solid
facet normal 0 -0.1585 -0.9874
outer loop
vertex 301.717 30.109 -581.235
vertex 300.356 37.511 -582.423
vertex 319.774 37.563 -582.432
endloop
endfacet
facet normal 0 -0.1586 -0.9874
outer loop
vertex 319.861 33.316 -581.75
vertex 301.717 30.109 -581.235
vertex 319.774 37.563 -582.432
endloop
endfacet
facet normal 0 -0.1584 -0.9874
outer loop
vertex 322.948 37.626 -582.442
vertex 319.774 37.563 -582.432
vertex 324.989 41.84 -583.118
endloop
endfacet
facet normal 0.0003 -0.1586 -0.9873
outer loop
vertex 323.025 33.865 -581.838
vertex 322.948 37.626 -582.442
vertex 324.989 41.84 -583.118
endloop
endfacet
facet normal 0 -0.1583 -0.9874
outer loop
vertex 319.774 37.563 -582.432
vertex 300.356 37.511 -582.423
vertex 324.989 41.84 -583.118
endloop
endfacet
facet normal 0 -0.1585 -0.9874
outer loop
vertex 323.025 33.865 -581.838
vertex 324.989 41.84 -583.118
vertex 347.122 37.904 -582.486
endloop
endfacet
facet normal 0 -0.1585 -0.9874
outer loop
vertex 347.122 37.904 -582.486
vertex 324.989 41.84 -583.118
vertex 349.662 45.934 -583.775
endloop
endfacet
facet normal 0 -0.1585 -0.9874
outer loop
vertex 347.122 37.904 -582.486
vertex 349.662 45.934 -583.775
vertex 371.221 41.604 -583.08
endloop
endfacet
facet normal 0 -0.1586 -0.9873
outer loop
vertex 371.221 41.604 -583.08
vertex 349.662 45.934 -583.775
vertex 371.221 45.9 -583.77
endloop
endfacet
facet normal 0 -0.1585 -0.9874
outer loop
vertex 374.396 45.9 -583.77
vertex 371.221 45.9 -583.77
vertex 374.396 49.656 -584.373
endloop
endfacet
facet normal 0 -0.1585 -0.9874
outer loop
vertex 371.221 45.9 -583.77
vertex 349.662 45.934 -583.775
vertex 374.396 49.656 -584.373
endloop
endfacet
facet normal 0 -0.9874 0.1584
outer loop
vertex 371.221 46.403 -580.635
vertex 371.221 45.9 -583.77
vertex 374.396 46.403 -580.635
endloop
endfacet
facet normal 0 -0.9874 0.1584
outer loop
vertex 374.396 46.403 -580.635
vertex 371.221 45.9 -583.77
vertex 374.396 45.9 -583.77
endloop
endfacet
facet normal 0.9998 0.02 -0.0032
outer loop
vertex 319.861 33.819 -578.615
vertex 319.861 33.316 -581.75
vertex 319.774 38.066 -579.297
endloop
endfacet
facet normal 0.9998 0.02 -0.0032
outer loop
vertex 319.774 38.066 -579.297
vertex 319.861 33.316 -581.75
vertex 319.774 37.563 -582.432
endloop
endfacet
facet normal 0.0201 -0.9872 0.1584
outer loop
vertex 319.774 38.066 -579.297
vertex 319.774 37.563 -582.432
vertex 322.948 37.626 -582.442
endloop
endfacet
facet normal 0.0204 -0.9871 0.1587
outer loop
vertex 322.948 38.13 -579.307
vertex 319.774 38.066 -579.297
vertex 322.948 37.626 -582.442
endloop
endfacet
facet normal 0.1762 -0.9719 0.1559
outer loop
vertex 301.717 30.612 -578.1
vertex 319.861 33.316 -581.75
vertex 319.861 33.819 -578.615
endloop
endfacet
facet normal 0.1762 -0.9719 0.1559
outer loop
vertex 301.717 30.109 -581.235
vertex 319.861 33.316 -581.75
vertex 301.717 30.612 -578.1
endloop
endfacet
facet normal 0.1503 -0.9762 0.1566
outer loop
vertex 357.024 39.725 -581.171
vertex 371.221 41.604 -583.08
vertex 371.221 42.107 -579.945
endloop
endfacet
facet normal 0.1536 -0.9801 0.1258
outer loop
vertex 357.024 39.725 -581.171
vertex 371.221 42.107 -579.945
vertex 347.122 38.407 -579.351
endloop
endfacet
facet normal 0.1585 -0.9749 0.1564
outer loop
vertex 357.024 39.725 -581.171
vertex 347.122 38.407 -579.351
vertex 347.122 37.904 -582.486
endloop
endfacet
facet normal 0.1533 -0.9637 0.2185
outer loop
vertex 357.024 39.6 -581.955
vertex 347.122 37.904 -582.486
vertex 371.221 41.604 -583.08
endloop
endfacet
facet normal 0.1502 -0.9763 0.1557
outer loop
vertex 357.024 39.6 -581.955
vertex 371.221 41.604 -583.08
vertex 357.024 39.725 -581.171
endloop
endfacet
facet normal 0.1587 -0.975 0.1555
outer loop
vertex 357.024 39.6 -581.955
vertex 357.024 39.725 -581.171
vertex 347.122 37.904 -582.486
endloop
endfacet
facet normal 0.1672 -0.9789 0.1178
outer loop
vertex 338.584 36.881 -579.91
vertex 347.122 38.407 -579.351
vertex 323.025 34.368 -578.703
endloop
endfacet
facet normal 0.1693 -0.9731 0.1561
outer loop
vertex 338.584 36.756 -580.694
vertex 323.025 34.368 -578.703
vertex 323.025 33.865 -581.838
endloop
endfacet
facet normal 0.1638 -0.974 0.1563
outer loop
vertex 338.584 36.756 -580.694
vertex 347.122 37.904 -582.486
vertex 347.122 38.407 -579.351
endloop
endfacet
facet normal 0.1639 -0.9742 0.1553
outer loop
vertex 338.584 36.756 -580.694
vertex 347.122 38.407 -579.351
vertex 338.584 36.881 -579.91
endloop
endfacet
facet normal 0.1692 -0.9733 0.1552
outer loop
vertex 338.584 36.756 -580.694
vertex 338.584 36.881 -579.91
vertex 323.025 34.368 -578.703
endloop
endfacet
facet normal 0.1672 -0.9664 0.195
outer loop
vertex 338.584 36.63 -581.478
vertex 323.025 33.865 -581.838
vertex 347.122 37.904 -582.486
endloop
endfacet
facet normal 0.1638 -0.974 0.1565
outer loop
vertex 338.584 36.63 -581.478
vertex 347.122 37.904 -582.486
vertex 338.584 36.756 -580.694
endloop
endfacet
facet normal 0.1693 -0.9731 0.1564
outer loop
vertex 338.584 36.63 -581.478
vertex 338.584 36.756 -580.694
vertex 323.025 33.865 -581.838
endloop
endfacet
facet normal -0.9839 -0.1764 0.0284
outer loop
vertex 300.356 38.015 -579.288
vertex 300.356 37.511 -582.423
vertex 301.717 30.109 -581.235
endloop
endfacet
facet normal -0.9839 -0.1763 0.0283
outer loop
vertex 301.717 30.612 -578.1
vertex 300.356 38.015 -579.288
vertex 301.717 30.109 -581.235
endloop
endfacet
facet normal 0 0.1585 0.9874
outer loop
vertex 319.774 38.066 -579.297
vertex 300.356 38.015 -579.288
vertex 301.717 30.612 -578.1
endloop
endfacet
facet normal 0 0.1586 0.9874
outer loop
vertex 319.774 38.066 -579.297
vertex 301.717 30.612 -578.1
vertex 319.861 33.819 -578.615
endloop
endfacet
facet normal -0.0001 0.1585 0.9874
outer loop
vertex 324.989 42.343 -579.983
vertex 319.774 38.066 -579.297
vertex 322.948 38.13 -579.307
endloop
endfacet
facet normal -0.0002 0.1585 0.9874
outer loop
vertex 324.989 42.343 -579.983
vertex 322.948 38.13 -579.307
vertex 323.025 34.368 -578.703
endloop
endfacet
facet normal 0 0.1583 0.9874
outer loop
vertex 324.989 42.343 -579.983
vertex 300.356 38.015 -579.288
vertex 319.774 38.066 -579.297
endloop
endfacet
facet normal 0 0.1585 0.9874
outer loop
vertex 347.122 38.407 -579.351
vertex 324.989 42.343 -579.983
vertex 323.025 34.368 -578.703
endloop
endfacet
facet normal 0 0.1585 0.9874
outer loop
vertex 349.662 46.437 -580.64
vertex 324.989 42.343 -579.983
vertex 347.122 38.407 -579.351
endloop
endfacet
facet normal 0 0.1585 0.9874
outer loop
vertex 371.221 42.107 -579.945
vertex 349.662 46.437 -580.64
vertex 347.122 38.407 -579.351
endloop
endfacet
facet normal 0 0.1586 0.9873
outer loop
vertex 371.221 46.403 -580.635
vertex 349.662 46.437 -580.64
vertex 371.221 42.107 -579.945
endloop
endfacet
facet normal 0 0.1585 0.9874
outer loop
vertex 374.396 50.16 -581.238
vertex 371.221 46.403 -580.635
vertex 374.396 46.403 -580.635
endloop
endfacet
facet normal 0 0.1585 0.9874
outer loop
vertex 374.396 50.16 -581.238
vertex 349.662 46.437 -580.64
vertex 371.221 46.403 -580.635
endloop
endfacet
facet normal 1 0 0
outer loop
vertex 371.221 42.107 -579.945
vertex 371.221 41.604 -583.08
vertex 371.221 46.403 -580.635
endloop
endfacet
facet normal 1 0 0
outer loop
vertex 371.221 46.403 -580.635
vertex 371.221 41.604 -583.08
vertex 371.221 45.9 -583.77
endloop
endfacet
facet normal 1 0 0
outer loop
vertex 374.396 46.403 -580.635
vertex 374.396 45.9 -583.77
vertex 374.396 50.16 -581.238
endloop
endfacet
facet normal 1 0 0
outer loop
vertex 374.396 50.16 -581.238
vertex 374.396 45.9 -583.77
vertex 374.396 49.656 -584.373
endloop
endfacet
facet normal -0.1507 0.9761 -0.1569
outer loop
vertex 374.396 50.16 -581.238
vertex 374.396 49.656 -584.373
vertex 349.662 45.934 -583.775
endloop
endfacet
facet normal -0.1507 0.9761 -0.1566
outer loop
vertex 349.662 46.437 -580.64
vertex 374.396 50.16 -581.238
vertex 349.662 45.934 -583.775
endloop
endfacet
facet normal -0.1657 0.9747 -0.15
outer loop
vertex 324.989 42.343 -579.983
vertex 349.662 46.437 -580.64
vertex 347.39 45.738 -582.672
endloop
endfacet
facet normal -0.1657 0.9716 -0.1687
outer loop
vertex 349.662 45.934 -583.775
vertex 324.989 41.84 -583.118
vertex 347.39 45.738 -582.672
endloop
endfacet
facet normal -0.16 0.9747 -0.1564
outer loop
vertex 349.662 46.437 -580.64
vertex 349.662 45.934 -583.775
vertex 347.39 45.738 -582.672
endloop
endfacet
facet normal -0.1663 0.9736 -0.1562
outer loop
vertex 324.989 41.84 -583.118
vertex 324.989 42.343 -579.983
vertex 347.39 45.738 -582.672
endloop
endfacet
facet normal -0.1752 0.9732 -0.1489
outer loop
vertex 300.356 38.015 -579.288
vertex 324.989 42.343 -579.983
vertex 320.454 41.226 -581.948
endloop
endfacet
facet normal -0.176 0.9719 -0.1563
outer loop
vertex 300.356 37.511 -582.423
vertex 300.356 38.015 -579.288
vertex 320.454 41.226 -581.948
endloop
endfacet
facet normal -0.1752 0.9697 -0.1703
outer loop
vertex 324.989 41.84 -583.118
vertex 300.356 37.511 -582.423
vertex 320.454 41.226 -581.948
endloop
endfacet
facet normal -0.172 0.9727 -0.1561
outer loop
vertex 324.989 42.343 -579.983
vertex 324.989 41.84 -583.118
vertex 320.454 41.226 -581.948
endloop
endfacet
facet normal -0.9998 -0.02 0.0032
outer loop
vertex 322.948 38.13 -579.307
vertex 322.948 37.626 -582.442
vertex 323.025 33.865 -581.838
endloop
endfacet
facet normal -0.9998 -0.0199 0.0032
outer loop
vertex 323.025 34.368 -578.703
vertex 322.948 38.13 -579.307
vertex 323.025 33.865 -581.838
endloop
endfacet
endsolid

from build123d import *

# Parameters (mm, degrees)
BOSS_EXTRUDE1_DEPTH = 3.175
CUT_EXTRUDE1_DEPTH  = 401.46617672


with BuildPart() as part:
    # Sketch3 → Boss-Extrude1 (new body)
    with BuildSketch(Plane(origin=(0, -90.186626134, -561.928406554), x_dir=(1, 0, 0), z_dir=(0, 0.15846690258874493, 0.9873642898059101))):
        with BuildLine():
            Line((374.396, 137.827848871), (374.396, 141.63269915))
            add(Edge.make_bspline(
                [(374.396, 141.63269915), (365.378247241, 140.351869422), (356.378821901, 138.957098969), (338.401992935, 136.030650092), (329.424670358, 134.498314058), (313.750786532, 131.748061478), (307.051747759, 130.548427396), (300.355738535, 129.33221679)],
                knots=[0, 0, 0, 0, 0.25, 0.25, 0.5, 0.5, 0.68681431, 0.68681431, 0.68681431, 0.68681431], degree=3))
            Line((300.355738535, 129.33221679), (301.717495498, 121.834882733))
            add(Edge.make_bspline(
                [(371.221, 133.4767647), (366.485652047, 132.785360934), (355.611621495, 131.127793525), (338.582430164, 128.339546997), (320.149202977, 125.153673819), (307.858393043, 122.950267206), (301.717495498, 121.834882733)],
                knots=[0.039503599, 0.039503599, 0.039503599, 0.039503599, 0.171703578, 0.343407155, 0.515110733, 0.68681431, 0.68681431, 0.68681431, 0.68681431], degree=3))
            Line((371.221, 133.4767647), (371.221, 137.827848871))
            Line((371.221, 137.827848871), (374.396, 137.827848871))
        make_face()
    extrude(amount=BOSS_EXTRUDE1_DEPTH)

    # Sketch4 → Cut-Extrude1 (cut, through all)
    with BuildSketch(Plane(origin=(0, -90.186626134, -561.928406554), x_dir=(-1, 0, 0), z_dir=(-9.1104866082071e-14, -0.158466902588134, -0.9873642898060083))):
        Polygon((-323.025447556, 125.638791395), (-323.025447556, 123.807923692), (-319.861053503, 123.734597093), (-319.861053503, 125.083150774), (-319.773665288, 129.384296303), (-322.948038155, 129.448791395), align=None)
    extrude(amount=-CUT_EXTRUDE1_DEPTH, mode=Mode.SUBTRACT)


solid = part.part
